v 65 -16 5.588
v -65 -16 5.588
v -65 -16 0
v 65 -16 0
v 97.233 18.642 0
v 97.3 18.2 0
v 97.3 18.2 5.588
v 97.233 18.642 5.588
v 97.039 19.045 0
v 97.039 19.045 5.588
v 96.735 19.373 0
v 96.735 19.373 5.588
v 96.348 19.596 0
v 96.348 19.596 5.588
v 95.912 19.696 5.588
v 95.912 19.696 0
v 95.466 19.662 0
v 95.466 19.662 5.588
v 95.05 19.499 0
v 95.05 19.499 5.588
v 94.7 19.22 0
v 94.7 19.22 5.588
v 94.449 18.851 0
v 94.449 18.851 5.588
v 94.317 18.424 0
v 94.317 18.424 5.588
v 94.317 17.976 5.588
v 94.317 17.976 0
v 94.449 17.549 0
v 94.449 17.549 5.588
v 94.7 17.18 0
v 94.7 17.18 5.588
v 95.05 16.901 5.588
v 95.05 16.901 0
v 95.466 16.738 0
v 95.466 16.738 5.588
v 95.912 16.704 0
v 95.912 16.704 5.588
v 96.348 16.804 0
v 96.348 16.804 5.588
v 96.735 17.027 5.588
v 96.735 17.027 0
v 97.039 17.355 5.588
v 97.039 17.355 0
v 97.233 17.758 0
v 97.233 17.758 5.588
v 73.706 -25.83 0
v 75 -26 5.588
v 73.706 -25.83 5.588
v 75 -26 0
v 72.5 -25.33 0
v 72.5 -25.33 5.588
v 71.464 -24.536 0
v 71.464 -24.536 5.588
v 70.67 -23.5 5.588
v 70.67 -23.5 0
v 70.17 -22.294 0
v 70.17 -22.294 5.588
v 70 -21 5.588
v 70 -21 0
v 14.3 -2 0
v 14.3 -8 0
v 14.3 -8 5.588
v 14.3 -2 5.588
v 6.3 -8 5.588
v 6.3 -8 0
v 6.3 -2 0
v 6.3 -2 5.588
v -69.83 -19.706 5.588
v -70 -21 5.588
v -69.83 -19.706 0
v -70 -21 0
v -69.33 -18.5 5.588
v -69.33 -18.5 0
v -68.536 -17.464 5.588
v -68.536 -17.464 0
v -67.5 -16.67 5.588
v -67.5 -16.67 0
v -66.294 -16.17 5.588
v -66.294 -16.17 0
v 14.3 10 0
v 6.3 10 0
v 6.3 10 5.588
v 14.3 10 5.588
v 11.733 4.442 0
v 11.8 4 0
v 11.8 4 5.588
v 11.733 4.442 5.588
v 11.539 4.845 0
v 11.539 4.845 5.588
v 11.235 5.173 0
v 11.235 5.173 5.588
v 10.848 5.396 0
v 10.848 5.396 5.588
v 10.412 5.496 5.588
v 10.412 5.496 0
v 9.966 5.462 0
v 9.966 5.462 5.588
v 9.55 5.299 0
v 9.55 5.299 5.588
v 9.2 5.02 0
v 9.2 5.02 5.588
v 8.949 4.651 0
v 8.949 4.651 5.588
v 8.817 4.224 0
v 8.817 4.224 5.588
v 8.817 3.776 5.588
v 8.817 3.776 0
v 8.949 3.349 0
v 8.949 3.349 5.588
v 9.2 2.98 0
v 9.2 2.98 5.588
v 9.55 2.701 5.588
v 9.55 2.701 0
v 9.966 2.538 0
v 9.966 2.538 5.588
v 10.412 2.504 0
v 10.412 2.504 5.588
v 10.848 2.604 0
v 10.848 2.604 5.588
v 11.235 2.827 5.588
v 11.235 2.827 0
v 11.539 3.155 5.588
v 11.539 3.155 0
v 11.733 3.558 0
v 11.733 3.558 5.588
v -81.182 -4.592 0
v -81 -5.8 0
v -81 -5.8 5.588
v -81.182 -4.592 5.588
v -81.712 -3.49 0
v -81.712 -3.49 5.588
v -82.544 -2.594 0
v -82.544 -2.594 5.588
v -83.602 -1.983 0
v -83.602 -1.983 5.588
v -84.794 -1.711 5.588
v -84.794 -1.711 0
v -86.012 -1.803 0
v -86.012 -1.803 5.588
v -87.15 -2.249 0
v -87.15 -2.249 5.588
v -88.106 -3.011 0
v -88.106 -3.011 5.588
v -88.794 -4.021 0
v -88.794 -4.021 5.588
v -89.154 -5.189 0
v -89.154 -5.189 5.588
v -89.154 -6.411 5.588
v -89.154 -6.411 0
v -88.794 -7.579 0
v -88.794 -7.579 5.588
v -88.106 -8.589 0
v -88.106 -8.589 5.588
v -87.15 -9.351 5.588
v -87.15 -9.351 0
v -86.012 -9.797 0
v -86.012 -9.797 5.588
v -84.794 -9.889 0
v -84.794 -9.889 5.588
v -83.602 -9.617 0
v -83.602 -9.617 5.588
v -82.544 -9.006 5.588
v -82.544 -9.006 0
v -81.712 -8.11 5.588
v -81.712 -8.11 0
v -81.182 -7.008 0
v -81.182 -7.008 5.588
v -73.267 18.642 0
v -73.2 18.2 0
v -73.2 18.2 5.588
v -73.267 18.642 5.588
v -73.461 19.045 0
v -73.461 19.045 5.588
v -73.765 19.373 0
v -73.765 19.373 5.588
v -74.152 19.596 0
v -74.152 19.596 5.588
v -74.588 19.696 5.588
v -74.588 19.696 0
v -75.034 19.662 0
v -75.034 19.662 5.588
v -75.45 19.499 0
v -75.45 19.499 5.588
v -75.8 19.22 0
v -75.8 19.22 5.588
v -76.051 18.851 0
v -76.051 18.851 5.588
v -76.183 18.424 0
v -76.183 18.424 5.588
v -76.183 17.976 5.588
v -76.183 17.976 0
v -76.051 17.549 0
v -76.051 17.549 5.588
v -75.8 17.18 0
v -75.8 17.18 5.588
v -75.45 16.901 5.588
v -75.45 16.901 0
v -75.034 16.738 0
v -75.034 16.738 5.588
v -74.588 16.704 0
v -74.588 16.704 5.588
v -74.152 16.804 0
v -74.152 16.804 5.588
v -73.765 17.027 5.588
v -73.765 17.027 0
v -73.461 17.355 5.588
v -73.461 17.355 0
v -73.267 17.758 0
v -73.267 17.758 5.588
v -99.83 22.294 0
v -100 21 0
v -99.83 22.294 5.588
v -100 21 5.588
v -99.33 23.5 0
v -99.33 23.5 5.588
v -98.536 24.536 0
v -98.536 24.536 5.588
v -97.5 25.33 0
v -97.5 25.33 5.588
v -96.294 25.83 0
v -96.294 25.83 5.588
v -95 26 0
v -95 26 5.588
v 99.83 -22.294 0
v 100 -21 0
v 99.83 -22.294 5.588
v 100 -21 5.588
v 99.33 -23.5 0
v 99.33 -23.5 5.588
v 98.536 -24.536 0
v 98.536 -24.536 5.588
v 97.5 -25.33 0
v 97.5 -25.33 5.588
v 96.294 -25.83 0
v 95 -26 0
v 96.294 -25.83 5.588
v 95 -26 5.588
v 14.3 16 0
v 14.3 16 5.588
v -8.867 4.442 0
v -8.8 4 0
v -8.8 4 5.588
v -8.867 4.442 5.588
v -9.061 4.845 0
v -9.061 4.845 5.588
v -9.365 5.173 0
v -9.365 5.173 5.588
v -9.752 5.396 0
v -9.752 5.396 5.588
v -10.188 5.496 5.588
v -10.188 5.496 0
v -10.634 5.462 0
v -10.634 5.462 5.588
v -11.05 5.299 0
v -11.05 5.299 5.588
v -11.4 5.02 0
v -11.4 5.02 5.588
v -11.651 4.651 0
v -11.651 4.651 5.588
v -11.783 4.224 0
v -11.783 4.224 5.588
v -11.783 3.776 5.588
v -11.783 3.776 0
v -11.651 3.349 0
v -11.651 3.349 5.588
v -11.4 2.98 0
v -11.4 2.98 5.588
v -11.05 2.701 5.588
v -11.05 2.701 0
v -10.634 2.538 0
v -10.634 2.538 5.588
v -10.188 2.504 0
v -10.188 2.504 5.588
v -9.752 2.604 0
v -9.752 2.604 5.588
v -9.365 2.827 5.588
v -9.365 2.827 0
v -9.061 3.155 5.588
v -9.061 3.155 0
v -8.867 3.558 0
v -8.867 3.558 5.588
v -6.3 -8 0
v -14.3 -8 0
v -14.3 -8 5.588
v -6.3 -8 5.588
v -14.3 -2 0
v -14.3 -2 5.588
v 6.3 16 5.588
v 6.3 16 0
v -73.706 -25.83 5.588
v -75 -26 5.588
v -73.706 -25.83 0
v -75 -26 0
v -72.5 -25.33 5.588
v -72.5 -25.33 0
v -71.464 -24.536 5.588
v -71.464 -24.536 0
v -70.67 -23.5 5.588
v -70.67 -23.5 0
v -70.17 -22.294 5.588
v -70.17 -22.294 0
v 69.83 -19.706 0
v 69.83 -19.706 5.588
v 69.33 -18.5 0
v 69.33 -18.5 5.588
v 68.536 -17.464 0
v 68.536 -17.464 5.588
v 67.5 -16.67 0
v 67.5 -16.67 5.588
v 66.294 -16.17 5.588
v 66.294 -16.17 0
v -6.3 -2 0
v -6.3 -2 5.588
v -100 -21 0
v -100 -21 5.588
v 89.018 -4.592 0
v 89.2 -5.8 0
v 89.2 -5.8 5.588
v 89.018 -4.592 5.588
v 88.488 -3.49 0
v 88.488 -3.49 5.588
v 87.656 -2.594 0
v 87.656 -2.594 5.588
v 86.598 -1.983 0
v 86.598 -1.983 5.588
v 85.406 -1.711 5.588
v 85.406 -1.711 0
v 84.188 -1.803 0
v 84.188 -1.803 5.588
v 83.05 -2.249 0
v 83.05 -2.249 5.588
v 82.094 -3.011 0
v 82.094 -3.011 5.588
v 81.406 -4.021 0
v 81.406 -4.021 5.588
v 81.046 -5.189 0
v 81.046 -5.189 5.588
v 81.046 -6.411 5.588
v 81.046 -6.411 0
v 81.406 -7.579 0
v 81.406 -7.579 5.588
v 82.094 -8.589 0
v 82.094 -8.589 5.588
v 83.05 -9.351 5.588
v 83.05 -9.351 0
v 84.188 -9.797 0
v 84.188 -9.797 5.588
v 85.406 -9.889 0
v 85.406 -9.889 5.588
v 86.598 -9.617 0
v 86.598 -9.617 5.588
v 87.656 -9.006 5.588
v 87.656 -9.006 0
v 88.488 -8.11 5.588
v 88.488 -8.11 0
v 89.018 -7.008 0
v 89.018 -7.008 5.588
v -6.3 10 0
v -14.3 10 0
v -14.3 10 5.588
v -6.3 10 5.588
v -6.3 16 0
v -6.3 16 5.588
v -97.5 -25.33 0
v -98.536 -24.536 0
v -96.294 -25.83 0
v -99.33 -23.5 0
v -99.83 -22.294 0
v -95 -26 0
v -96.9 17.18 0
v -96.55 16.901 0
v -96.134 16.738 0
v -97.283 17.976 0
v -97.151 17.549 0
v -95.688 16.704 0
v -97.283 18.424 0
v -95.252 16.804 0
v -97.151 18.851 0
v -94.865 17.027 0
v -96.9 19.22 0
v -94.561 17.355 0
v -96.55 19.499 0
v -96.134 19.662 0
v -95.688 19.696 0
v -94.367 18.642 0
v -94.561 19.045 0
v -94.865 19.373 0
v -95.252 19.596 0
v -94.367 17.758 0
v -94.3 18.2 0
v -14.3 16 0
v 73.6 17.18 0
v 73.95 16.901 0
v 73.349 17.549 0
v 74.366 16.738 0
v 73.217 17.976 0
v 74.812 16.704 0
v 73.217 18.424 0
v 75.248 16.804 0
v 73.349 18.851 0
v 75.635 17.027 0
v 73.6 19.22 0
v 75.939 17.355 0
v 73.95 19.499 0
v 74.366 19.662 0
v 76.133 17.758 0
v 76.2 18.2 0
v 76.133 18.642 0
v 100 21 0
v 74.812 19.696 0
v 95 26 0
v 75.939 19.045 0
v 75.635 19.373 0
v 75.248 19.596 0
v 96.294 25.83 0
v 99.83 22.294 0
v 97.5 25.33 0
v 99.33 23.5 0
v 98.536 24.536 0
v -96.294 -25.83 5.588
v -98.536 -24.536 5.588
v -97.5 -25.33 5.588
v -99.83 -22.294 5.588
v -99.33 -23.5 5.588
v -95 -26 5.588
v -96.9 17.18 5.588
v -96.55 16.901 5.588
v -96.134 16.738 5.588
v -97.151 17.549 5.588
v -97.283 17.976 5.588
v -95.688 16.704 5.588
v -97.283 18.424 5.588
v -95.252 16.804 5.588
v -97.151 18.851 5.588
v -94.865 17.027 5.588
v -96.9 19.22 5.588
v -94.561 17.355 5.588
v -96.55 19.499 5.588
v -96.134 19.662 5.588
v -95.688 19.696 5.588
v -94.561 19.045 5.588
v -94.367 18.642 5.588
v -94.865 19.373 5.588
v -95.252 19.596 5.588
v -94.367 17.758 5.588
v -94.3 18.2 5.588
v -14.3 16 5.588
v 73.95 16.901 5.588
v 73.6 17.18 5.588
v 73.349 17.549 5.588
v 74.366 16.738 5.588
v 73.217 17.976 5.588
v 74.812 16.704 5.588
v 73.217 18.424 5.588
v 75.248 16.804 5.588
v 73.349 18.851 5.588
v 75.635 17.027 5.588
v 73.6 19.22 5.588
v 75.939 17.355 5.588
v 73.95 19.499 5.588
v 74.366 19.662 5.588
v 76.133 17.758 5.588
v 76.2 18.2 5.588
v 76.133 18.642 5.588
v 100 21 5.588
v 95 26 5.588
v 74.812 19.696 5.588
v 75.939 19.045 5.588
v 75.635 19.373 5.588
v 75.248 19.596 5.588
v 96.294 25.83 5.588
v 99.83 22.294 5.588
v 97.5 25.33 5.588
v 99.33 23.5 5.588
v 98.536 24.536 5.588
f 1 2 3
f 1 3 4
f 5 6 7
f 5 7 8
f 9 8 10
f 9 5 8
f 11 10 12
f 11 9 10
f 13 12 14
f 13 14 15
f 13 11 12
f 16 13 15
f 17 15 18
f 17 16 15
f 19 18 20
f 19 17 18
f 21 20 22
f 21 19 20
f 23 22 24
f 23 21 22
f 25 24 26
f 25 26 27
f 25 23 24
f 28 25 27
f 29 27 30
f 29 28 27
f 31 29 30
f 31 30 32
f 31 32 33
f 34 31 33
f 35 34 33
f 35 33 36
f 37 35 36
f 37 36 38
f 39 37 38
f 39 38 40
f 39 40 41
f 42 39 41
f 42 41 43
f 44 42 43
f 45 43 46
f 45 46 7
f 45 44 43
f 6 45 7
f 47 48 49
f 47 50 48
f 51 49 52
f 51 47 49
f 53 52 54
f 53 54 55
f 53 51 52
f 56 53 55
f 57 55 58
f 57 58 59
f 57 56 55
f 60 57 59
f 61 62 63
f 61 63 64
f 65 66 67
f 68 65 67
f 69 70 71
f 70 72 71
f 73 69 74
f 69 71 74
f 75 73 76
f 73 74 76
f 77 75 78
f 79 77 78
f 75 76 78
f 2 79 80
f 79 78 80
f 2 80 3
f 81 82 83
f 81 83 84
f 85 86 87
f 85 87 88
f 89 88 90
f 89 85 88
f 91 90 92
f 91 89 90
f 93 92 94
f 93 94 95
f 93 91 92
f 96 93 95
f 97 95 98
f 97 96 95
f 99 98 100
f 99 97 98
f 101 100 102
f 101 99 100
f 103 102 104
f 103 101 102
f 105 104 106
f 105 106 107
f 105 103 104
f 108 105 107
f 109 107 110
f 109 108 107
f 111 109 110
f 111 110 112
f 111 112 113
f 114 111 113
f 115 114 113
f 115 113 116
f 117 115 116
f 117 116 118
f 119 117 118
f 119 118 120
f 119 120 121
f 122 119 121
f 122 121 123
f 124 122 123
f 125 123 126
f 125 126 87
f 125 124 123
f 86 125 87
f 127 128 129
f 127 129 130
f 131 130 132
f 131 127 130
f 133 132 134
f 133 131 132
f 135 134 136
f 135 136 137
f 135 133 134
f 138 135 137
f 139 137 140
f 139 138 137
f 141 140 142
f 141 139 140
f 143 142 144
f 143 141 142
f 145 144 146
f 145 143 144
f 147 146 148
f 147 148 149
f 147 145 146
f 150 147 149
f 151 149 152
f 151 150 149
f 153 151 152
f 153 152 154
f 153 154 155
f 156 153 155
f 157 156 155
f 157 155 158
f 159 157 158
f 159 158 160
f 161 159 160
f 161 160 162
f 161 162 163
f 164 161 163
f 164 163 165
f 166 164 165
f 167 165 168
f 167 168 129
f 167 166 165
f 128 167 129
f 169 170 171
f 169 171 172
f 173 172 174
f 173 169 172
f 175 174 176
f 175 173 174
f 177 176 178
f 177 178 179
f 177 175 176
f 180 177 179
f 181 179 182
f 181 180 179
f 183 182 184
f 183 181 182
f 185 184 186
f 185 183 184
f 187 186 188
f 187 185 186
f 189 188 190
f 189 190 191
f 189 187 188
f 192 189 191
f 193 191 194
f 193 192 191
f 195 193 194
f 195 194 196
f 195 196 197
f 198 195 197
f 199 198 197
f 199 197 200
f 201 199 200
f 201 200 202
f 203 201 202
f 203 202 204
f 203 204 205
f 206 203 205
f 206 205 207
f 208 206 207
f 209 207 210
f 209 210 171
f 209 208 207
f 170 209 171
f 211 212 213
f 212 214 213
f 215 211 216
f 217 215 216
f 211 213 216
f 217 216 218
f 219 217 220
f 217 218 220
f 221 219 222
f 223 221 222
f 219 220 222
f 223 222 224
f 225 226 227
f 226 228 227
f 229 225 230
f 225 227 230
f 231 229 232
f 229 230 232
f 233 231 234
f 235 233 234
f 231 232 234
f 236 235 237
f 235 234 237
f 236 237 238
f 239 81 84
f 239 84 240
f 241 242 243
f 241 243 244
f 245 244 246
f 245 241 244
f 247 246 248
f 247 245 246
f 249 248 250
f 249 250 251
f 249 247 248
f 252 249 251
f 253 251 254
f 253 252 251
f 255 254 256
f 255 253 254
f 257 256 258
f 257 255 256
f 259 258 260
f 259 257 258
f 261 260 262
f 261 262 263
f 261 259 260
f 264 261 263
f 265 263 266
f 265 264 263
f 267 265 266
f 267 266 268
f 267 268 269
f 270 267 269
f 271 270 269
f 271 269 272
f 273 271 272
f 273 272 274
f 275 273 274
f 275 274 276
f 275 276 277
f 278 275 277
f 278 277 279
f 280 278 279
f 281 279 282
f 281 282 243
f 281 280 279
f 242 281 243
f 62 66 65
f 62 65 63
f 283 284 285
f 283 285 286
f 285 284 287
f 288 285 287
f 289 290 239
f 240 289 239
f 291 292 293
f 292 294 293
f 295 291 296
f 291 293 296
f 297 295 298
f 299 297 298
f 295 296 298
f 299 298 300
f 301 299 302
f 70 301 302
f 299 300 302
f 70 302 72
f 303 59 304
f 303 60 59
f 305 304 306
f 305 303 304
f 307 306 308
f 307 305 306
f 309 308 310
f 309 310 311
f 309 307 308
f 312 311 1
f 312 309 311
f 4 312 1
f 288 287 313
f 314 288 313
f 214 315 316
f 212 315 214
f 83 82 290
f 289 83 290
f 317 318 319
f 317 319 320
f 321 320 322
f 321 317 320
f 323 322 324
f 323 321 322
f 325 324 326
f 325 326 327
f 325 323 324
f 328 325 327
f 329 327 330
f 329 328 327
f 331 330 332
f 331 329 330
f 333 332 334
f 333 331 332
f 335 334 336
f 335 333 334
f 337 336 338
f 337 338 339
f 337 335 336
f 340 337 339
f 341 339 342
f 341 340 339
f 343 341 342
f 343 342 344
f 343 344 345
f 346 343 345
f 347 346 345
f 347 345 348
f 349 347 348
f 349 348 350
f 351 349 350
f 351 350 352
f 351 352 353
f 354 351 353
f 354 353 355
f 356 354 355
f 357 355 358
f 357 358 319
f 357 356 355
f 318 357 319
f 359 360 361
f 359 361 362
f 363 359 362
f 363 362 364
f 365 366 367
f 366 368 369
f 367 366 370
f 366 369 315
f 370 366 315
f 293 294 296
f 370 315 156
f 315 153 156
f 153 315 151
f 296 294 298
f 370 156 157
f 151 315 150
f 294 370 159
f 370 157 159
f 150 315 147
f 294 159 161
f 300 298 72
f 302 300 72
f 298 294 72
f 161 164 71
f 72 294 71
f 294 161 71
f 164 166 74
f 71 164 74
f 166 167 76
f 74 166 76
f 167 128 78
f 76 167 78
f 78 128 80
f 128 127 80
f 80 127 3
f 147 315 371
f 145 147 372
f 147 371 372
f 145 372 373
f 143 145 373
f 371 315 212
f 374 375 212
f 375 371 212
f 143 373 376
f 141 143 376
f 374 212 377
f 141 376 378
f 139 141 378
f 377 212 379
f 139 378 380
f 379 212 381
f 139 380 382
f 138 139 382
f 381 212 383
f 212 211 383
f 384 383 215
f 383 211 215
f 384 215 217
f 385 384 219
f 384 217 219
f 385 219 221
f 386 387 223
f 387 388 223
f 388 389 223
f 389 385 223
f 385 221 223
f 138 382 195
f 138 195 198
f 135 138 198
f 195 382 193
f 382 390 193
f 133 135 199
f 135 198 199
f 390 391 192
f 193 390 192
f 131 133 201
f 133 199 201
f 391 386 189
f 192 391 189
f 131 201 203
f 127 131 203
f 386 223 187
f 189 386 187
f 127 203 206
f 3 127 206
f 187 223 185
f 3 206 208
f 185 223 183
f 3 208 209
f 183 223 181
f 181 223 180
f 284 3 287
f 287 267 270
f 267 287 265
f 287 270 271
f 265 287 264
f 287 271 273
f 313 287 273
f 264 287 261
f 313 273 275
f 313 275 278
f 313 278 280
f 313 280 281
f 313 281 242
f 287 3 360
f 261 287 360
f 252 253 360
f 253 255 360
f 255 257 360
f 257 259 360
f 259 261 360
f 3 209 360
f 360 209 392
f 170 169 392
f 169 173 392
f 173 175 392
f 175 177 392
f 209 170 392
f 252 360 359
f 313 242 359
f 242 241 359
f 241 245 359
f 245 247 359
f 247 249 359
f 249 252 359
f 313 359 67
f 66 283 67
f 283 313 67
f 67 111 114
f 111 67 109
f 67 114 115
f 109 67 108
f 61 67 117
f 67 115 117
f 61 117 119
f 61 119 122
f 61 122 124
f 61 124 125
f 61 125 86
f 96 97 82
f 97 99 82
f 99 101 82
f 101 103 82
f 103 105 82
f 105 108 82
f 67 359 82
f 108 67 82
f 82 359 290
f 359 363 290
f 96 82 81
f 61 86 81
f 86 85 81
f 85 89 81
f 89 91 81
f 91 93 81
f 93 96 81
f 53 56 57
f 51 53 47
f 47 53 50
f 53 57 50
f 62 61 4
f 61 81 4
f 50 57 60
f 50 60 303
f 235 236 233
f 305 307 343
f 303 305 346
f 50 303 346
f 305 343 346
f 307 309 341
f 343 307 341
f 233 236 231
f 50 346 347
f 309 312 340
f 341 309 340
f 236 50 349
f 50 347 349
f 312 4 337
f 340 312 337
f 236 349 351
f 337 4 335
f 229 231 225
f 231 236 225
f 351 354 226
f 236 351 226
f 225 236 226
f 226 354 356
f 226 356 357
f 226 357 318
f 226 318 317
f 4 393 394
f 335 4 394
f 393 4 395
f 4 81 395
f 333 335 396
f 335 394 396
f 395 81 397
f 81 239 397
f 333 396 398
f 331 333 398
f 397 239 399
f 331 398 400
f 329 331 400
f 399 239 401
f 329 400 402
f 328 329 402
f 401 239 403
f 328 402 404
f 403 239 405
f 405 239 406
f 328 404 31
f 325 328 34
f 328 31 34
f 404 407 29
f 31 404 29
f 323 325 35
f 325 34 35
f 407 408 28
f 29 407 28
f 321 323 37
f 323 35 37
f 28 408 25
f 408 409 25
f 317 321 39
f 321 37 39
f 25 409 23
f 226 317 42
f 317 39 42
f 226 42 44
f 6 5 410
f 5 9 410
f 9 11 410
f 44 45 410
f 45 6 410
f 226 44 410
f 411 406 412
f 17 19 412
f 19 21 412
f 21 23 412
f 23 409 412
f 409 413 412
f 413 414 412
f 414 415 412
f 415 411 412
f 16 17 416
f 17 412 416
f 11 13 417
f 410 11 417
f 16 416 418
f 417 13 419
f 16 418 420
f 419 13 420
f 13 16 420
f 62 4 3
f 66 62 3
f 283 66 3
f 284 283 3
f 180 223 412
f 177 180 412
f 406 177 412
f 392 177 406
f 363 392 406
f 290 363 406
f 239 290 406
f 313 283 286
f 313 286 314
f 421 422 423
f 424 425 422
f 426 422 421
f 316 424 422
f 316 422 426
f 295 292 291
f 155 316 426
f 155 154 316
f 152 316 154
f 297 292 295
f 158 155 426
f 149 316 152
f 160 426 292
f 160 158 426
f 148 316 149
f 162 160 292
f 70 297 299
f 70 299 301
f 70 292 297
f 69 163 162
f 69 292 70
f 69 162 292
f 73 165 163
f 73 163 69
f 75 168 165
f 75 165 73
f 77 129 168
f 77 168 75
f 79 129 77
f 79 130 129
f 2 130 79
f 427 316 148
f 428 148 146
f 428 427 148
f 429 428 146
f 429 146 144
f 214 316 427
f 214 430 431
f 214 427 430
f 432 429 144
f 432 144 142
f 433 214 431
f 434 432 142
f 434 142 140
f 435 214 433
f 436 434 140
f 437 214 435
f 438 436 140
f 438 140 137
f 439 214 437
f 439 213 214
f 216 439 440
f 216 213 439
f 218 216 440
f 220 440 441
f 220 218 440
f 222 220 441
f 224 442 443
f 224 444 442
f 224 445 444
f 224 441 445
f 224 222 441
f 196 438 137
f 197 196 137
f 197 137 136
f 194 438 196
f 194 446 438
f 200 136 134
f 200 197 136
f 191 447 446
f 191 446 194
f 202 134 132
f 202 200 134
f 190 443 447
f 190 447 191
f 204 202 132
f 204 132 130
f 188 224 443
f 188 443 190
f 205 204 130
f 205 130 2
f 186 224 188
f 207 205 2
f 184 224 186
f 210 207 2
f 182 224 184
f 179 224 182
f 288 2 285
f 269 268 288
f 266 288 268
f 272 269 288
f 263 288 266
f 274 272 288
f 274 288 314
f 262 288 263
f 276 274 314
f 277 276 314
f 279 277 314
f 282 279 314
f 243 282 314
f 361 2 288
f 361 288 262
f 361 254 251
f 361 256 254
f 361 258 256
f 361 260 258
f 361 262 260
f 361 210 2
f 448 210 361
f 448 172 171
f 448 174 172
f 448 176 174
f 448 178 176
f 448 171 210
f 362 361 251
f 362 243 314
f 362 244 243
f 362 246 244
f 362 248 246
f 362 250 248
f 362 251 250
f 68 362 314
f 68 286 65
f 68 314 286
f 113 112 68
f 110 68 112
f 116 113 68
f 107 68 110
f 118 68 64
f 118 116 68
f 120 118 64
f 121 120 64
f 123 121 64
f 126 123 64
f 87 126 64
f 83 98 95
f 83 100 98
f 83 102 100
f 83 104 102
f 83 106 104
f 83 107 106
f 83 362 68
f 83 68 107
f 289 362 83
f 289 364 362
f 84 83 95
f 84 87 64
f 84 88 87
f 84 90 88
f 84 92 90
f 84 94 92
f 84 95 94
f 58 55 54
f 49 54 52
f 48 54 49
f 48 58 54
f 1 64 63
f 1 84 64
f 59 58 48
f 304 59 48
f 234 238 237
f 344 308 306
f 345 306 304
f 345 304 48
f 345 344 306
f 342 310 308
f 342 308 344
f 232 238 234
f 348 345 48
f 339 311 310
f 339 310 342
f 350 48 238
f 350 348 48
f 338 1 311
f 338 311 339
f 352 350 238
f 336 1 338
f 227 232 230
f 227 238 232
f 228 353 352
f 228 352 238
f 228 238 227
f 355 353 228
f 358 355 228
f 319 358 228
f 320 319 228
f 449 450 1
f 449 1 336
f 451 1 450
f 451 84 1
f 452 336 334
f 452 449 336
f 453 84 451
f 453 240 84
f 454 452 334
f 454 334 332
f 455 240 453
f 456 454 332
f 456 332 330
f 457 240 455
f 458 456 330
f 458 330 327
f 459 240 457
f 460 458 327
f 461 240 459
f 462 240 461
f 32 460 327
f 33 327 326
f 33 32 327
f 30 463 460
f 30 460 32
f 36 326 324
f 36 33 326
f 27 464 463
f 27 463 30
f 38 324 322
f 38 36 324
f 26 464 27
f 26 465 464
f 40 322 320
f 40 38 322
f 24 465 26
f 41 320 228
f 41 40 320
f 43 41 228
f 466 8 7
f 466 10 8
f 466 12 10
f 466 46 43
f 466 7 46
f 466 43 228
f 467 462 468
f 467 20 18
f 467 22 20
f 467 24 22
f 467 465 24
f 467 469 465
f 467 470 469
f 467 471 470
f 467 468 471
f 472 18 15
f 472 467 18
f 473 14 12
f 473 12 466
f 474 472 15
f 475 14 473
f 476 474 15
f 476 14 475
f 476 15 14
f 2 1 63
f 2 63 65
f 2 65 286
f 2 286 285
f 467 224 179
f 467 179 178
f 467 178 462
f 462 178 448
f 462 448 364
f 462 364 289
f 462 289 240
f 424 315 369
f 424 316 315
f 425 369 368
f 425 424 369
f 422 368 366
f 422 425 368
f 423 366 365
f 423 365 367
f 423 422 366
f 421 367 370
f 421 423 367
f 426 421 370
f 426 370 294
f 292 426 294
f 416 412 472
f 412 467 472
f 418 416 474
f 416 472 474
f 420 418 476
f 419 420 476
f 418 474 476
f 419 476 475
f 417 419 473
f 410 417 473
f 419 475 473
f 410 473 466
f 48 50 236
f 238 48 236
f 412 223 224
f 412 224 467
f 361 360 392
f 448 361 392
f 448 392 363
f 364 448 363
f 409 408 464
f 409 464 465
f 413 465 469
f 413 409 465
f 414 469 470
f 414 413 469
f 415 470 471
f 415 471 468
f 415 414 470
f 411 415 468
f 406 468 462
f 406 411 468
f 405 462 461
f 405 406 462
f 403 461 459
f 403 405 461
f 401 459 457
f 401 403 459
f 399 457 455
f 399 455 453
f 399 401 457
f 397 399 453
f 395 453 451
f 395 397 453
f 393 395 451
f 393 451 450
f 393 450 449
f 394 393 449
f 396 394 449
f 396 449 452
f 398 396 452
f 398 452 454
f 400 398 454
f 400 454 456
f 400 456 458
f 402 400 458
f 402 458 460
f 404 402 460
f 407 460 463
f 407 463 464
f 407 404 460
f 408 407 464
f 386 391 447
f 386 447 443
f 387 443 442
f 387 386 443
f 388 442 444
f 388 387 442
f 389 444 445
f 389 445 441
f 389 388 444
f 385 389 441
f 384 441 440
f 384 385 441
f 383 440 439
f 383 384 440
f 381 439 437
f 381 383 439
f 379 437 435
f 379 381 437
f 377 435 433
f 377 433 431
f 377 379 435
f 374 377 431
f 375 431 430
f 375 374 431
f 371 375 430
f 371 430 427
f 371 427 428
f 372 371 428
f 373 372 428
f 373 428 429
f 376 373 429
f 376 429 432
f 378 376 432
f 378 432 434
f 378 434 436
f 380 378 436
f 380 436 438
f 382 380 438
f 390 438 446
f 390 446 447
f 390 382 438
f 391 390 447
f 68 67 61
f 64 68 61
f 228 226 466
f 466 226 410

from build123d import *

# Parameters (mm, degrees)
F0_W     = 200
F0_H     = 52
F0_R     = 4.1
F0_W_2   = 8
F0_H_2   = 6
F0_R_2   = 1.5
F1_DEPTH = 5.588
F2_W     = 140
F2_H     = 10
F3_DEPTH = 25
F4_R     = 4.99999


# Not quite as in the source:
# - a fillet or chamfer is up to 0.001 mm smaller than in the source, because OpenCascade refuses the exact size


with BuildPart() as f1:
    # F0 (on Top) → F1 (new body)
    with BuildSketch(Plane.XY):
        Rectangle(F0_W, F0_H)
        with Locations((-85.1, -5.8)):
            Circle(F0_R, mode=Mode.SUBTRACT)
        with Locations((-10.3, -5)):
            Rectangle(F0_W_2, F0_H_2, mode=Mode.SUBTRACT)
        with Locations((10.3, -5)):
            Rectangle(F0_W_2, F0_H_2, mode=Mode.SUBTRACT)
        with Locations((85.1, -5.8)):
            Circle(F0_R, mode=Mode.SUBTRACT)
        with Locations((-10.3, 4)):
            Circle(F0_R_2, mode=Mode.SUBTRACT)
        with Locations((-95.8, 18.2)):
            Circle(F0_R_2, mode=Mode.SUBTRACT)
        with Locations((-74.7, 18.2)):
            Circle(F0_R_2, mode=Mode.SUBTRACT)
        with Locations((-10.3, 13)):
            Rectangle(F0_W_2, F0_H_2, mode=Mode.SUBTRACT)
        with Locations((10.3, 4)):
            Circle(F0_R_2, mode=Mode.SUBTRACT)
        with Locations((10.3, 13)):
            Rectangle(F0_W_2, F0_H_2, mode=Mode.SUBTRACT)
        with Locations((74.7, 18.2)):
            Circle(F0_R_2, mode=Mode.SUBTRACT)
        with Locations((95.8, 18.2)):
            Circle(F0_R_2, mode=Mode.SUBTRACT)
    extrude(amount=F1_DEPTH)

    # F2 (on face) → F3 (cut)
    with BuildSketch(Plane.XY.offset(5.588)):
        with Locations((0, -21)):
            Rectangle(F2_W, F2_H)
    extrude(amount=-F3_DEPTH, mode=Mode.SUBTRACT)

    # F4 (radius 5 in the source; OpenCascade refuses exactly that, so slightly less here)
    f4_edges = [f1.edges().sort_by_distance(p)[0] for p in [
        (-100, 26, 2.794),
        (-100, -26, 2.794),
        (-70, -26, 2.794),
        (-70, -16, 2.794),
        (70, -16, 2.794),
        (70, -26, 2.794),
        (100, -26, 2.794),
        (100, 26, 2.794),
    ]]
    fillet(f4_edges, radius=F4_R)


solid = f1.part
